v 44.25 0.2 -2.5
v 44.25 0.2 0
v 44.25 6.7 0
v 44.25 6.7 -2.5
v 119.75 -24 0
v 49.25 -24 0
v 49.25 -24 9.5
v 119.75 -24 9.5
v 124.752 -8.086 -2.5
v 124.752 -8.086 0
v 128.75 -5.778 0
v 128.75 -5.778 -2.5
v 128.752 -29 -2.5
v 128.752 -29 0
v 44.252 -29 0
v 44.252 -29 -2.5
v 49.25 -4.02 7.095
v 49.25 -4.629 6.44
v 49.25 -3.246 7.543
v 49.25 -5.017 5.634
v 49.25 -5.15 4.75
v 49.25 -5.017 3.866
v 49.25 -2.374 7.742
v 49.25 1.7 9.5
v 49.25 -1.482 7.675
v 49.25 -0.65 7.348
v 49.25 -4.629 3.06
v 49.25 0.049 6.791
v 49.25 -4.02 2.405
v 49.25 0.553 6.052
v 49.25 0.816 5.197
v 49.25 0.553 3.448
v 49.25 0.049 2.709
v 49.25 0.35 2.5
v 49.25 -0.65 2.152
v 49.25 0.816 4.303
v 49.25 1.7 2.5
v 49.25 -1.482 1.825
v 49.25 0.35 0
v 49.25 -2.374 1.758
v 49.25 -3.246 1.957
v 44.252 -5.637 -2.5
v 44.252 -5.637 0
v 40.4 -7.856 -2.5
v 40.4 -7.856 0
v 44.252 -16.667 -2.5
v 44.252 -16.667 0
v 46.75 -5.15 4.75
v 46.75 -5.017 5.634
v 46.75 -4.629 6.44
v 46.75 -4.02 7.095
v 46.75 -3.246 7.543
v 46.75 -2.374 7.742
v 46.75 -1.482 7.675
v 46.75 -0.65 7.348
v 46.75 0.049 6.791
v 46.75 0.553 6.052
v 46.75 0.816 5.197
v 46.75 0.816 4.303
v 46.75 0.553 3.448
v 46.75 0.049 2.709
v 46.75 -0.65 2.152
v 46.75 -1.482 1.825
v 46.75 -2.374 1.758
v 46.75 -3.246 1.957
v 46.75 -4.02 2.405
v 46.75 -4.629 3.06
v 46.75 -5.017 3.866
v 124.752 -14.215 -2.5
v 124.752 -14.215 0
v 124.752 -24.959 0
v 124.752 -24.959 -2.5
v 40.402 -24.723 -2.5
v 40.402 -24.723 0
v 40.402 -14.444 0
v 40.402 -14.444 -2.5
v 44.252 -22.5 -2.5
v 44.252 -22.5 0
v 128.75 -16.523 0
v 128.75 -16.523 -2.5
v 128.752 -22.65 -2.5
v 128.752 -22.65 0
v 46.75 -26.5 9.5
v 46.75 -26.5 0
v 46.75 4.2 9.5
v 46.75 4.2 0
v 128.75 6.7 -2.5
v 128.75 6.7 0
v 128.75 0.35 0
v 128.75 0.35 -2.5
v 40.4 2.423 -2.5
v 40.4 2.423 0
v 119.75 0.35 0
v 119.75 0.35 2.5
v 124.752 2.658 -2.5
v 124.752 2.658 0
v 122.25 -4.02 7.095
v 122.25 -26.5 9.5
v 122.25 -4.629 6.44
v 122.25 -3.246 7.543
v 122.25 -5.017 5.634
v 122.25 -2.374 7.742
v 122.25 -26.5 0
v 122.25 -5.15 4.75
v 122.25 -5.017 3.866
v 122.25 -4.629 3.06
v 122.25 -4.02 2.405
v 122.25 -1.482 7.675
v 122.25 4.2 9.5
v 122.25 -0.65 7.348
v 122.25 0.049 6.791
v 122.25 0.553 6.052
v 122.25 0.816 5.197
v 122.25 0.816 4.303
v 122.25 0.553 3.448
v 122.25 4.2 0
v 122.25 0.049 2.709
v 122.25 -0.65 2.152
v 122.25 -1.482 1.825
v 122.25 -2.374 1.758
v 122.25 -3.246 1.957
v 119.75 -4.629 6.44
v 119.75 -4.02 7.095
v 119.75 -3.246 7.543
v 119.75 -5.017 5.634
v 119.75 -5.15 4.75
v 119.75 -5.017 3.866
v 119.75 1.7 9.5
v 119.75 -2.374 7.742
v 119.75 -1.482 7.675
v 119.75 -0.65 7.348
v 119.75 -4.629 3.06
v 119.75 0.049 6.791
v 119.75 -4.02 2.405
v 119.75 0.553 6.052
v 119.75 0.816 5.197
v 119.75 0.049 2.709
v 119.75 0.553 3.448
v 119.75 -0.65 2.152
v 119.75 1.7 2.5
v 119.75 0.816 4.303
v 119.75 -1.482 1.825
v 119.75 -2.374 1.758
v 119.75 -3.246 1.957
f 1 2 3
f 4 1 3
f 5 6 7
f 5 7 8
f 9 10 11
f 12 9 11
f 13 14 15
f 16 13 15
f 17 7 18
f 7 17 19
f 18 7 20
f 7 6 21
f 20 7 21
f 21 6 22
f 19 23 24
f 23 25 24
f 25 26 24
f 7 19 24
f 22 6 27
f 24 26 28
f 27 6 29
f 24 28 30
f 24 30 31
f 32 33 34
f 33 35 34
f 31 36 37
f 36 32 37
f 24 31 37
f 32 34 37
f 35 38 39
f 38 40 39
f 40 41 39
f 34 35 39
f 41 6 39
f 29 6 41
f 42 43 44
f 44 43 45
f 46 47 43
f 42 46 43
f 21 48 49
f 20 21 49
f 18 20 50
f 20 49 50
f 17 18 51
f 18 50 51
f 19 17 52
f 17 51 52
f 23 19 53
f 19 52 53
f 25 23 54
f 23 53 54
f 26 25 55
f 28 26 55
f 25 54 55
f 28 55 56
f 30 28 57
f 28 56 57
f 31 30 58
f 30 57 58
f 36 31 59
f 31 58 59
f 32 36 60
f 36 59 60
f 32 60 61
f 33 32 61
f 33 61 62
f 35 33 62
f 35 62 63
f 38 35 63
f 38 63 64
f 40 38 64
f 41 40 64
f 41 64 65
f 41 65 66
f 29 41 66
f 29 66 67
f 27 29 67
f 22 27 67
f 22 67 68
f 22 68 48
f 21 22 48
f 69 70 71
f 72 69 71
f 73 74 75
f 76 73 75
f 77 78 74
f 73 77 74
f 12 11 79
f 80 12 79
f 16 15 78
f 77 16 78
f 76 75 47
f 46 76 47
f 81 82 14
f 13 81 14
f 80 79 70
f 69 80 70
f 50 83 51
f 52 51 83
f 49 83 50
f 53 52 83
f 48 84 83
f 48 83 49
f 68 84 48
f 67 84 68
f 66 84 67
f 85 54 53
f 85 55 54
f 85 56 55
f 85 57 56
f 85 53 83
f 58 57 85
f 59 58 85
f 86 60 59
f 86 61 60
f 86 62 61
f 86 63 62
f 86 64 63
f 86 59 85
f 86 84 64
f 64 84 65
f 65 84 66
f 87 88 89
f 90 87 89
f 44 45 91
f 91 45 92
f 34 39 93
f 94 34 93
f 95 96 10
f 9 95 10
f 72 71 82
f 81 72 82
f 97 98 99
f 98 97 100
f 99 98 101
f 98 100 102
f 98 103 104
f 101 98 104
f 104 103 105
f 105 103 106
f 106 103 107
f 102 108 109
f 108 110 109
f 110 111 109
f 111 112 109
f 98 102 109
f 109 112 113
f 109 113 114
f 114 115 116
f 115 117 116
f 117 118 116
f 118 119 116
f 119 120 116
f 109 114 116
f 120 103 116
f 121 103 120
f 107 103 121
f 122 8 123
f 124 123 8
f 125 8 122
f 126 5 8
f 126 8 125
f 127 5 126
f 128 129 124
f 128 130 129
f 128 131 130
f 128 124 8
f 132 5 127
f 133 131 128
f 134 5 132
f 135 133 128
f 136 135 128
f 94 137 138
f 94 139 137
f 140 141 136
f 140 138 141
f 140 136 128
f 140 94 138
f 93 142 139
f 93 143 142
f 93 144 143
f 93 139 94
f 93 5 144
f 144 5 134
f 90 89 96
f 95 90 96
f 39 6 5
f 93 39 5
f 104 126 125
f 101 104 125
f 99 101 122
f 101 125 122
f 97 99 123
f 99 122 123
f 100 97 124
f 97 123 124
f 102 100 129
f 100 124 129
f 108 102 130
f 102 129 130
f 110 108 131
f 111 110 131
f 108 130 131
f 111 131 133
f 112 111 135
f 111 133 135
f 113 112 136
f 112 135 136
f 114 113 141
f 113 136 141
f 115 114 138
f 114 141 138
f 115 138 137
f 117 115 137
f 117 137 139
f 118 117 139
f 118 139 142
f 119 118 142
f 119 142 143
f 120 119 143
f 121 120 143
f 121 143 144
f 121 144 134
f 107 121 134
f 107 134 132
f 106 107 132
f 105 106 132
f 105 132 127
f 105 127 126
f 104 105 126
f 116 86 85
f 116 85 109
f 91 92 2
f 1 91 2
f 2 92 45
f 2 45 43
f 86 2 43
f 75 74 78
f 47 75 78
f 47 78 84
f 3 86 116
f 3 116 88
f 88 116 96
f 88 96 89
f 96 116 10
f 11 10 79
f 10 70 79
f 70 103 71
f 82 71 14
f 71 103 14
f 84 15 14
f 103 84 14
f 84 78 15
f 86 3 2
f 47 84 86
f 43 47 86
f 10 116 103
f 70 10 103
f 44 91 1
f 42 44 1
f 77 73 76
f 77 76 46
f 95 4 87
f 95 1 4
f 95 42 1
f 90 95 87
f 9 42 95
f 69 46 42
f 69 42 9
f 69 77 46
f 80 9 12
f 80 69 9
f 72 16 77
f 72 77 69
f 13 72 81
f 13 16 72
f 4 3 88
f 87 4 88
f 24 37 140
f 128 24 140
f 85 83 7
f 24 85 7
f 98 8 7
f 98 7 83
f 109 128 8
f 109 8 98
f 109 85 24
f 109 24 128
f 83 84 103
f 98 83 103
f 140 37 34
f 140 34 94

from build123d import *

# Parameters (mm, degrees)
SKETCH006_W     = 70.5
SKETCH006_H     = 25.7
PAD003_DEPTH    = 9.5
THICKNESS001_T  = 2.5
SKETCH007_R     = 3
POCKET002_DEPTH = 75.501
SKETCH046_W     = 70.5
SKETCH046_H     = 1.5
PAD039_DEPTH    = 2.5
PAD002_DEPTH    = 2.5


with BuildPart() as body002:
    # Sketch006 → Pad003 (new body)
    with BuildSketch(Plane.XY):
        with Locations((0, -48)):
            Rectangle(SKETCH006_W, SKETCH006_H)
    extrude(amount=PAD003_DEPTH)

    # Thickness001
    thickness001_openings = [body002.faces().sort_by_distance(p)[0] for p in [
        (0, -48, 9.5),
        (0, -48, 0),
    ]]
    offset(amount=THICKNESS001_T, openings=thickness001_openings, kind=Kind.INTERSECTION)

    # Sketch007 (on Face6 of Thickness001) → Pocket002 (cut, through all)
    with BuildSketch(Plane(origin=(-37.75, 0, 0), x_dir=(0, -1, 0), z_dir=(-1, 0, 0))):
        with Locations((39, 4.75)):
            Circle(SKETCH007_R)
    extrude(amount=-POCKET002_DEPTH, mode=Mode.SUBTRACT)

    # Sketch046 → Pad039 (join)
    with BuildSketch(Plane.XY):
        with Locations((0, -35.75)):
            Rectangle(SKETCH046_W, SKETCH046_H)
    extrude(amount=PAD039_DEPTH)


with BuildPart() as body002_1:
    # Body002 placement: moved
    add(body002.part.moved(Location((84.5, 36.85, 0))))


with BuildPart() as middle:
    # Sketch005 → Pad002 (new body)
    with BuildSketch(Plane(origin=(0, 0, 0), x_dir=(1, 0, 0), z_dir=(0, 0, -1))):
        Polygon((-40.25, 30.15), (40.25, 30.15), (44.25, 30.15), (44.25, 36.5), (40.251921, 34.191708), (40.251921, 44.936467), (44.25, 42.628175), (44.25, 53.372934), (40.251921, 51.064642), (40.251921, 61.809401), (44.251921, 59.5), (44.251921, 65.85), (40.251921, 65.85), (-40.248079, 65.85), (-40.248079, 59.35), (-44.098079, 61.572799), (-44.098079, 51.293867), (-40.248079, 53.516665), (-40.248079, 42.486665), (-44.1, 44.706133), (-44.1, 34.427201), (-40.25, 36.65), align=None)
    extrude(amount=PAD002_DEPTH)


with BuildPart() as middle_1:
    # Body001 placement: moved
    add(middle.part.moved(Location((84.5, 36.85, 0))))

    # Fusion003: union Body002
    add(body002_1.part)


solid = middle_1.part
